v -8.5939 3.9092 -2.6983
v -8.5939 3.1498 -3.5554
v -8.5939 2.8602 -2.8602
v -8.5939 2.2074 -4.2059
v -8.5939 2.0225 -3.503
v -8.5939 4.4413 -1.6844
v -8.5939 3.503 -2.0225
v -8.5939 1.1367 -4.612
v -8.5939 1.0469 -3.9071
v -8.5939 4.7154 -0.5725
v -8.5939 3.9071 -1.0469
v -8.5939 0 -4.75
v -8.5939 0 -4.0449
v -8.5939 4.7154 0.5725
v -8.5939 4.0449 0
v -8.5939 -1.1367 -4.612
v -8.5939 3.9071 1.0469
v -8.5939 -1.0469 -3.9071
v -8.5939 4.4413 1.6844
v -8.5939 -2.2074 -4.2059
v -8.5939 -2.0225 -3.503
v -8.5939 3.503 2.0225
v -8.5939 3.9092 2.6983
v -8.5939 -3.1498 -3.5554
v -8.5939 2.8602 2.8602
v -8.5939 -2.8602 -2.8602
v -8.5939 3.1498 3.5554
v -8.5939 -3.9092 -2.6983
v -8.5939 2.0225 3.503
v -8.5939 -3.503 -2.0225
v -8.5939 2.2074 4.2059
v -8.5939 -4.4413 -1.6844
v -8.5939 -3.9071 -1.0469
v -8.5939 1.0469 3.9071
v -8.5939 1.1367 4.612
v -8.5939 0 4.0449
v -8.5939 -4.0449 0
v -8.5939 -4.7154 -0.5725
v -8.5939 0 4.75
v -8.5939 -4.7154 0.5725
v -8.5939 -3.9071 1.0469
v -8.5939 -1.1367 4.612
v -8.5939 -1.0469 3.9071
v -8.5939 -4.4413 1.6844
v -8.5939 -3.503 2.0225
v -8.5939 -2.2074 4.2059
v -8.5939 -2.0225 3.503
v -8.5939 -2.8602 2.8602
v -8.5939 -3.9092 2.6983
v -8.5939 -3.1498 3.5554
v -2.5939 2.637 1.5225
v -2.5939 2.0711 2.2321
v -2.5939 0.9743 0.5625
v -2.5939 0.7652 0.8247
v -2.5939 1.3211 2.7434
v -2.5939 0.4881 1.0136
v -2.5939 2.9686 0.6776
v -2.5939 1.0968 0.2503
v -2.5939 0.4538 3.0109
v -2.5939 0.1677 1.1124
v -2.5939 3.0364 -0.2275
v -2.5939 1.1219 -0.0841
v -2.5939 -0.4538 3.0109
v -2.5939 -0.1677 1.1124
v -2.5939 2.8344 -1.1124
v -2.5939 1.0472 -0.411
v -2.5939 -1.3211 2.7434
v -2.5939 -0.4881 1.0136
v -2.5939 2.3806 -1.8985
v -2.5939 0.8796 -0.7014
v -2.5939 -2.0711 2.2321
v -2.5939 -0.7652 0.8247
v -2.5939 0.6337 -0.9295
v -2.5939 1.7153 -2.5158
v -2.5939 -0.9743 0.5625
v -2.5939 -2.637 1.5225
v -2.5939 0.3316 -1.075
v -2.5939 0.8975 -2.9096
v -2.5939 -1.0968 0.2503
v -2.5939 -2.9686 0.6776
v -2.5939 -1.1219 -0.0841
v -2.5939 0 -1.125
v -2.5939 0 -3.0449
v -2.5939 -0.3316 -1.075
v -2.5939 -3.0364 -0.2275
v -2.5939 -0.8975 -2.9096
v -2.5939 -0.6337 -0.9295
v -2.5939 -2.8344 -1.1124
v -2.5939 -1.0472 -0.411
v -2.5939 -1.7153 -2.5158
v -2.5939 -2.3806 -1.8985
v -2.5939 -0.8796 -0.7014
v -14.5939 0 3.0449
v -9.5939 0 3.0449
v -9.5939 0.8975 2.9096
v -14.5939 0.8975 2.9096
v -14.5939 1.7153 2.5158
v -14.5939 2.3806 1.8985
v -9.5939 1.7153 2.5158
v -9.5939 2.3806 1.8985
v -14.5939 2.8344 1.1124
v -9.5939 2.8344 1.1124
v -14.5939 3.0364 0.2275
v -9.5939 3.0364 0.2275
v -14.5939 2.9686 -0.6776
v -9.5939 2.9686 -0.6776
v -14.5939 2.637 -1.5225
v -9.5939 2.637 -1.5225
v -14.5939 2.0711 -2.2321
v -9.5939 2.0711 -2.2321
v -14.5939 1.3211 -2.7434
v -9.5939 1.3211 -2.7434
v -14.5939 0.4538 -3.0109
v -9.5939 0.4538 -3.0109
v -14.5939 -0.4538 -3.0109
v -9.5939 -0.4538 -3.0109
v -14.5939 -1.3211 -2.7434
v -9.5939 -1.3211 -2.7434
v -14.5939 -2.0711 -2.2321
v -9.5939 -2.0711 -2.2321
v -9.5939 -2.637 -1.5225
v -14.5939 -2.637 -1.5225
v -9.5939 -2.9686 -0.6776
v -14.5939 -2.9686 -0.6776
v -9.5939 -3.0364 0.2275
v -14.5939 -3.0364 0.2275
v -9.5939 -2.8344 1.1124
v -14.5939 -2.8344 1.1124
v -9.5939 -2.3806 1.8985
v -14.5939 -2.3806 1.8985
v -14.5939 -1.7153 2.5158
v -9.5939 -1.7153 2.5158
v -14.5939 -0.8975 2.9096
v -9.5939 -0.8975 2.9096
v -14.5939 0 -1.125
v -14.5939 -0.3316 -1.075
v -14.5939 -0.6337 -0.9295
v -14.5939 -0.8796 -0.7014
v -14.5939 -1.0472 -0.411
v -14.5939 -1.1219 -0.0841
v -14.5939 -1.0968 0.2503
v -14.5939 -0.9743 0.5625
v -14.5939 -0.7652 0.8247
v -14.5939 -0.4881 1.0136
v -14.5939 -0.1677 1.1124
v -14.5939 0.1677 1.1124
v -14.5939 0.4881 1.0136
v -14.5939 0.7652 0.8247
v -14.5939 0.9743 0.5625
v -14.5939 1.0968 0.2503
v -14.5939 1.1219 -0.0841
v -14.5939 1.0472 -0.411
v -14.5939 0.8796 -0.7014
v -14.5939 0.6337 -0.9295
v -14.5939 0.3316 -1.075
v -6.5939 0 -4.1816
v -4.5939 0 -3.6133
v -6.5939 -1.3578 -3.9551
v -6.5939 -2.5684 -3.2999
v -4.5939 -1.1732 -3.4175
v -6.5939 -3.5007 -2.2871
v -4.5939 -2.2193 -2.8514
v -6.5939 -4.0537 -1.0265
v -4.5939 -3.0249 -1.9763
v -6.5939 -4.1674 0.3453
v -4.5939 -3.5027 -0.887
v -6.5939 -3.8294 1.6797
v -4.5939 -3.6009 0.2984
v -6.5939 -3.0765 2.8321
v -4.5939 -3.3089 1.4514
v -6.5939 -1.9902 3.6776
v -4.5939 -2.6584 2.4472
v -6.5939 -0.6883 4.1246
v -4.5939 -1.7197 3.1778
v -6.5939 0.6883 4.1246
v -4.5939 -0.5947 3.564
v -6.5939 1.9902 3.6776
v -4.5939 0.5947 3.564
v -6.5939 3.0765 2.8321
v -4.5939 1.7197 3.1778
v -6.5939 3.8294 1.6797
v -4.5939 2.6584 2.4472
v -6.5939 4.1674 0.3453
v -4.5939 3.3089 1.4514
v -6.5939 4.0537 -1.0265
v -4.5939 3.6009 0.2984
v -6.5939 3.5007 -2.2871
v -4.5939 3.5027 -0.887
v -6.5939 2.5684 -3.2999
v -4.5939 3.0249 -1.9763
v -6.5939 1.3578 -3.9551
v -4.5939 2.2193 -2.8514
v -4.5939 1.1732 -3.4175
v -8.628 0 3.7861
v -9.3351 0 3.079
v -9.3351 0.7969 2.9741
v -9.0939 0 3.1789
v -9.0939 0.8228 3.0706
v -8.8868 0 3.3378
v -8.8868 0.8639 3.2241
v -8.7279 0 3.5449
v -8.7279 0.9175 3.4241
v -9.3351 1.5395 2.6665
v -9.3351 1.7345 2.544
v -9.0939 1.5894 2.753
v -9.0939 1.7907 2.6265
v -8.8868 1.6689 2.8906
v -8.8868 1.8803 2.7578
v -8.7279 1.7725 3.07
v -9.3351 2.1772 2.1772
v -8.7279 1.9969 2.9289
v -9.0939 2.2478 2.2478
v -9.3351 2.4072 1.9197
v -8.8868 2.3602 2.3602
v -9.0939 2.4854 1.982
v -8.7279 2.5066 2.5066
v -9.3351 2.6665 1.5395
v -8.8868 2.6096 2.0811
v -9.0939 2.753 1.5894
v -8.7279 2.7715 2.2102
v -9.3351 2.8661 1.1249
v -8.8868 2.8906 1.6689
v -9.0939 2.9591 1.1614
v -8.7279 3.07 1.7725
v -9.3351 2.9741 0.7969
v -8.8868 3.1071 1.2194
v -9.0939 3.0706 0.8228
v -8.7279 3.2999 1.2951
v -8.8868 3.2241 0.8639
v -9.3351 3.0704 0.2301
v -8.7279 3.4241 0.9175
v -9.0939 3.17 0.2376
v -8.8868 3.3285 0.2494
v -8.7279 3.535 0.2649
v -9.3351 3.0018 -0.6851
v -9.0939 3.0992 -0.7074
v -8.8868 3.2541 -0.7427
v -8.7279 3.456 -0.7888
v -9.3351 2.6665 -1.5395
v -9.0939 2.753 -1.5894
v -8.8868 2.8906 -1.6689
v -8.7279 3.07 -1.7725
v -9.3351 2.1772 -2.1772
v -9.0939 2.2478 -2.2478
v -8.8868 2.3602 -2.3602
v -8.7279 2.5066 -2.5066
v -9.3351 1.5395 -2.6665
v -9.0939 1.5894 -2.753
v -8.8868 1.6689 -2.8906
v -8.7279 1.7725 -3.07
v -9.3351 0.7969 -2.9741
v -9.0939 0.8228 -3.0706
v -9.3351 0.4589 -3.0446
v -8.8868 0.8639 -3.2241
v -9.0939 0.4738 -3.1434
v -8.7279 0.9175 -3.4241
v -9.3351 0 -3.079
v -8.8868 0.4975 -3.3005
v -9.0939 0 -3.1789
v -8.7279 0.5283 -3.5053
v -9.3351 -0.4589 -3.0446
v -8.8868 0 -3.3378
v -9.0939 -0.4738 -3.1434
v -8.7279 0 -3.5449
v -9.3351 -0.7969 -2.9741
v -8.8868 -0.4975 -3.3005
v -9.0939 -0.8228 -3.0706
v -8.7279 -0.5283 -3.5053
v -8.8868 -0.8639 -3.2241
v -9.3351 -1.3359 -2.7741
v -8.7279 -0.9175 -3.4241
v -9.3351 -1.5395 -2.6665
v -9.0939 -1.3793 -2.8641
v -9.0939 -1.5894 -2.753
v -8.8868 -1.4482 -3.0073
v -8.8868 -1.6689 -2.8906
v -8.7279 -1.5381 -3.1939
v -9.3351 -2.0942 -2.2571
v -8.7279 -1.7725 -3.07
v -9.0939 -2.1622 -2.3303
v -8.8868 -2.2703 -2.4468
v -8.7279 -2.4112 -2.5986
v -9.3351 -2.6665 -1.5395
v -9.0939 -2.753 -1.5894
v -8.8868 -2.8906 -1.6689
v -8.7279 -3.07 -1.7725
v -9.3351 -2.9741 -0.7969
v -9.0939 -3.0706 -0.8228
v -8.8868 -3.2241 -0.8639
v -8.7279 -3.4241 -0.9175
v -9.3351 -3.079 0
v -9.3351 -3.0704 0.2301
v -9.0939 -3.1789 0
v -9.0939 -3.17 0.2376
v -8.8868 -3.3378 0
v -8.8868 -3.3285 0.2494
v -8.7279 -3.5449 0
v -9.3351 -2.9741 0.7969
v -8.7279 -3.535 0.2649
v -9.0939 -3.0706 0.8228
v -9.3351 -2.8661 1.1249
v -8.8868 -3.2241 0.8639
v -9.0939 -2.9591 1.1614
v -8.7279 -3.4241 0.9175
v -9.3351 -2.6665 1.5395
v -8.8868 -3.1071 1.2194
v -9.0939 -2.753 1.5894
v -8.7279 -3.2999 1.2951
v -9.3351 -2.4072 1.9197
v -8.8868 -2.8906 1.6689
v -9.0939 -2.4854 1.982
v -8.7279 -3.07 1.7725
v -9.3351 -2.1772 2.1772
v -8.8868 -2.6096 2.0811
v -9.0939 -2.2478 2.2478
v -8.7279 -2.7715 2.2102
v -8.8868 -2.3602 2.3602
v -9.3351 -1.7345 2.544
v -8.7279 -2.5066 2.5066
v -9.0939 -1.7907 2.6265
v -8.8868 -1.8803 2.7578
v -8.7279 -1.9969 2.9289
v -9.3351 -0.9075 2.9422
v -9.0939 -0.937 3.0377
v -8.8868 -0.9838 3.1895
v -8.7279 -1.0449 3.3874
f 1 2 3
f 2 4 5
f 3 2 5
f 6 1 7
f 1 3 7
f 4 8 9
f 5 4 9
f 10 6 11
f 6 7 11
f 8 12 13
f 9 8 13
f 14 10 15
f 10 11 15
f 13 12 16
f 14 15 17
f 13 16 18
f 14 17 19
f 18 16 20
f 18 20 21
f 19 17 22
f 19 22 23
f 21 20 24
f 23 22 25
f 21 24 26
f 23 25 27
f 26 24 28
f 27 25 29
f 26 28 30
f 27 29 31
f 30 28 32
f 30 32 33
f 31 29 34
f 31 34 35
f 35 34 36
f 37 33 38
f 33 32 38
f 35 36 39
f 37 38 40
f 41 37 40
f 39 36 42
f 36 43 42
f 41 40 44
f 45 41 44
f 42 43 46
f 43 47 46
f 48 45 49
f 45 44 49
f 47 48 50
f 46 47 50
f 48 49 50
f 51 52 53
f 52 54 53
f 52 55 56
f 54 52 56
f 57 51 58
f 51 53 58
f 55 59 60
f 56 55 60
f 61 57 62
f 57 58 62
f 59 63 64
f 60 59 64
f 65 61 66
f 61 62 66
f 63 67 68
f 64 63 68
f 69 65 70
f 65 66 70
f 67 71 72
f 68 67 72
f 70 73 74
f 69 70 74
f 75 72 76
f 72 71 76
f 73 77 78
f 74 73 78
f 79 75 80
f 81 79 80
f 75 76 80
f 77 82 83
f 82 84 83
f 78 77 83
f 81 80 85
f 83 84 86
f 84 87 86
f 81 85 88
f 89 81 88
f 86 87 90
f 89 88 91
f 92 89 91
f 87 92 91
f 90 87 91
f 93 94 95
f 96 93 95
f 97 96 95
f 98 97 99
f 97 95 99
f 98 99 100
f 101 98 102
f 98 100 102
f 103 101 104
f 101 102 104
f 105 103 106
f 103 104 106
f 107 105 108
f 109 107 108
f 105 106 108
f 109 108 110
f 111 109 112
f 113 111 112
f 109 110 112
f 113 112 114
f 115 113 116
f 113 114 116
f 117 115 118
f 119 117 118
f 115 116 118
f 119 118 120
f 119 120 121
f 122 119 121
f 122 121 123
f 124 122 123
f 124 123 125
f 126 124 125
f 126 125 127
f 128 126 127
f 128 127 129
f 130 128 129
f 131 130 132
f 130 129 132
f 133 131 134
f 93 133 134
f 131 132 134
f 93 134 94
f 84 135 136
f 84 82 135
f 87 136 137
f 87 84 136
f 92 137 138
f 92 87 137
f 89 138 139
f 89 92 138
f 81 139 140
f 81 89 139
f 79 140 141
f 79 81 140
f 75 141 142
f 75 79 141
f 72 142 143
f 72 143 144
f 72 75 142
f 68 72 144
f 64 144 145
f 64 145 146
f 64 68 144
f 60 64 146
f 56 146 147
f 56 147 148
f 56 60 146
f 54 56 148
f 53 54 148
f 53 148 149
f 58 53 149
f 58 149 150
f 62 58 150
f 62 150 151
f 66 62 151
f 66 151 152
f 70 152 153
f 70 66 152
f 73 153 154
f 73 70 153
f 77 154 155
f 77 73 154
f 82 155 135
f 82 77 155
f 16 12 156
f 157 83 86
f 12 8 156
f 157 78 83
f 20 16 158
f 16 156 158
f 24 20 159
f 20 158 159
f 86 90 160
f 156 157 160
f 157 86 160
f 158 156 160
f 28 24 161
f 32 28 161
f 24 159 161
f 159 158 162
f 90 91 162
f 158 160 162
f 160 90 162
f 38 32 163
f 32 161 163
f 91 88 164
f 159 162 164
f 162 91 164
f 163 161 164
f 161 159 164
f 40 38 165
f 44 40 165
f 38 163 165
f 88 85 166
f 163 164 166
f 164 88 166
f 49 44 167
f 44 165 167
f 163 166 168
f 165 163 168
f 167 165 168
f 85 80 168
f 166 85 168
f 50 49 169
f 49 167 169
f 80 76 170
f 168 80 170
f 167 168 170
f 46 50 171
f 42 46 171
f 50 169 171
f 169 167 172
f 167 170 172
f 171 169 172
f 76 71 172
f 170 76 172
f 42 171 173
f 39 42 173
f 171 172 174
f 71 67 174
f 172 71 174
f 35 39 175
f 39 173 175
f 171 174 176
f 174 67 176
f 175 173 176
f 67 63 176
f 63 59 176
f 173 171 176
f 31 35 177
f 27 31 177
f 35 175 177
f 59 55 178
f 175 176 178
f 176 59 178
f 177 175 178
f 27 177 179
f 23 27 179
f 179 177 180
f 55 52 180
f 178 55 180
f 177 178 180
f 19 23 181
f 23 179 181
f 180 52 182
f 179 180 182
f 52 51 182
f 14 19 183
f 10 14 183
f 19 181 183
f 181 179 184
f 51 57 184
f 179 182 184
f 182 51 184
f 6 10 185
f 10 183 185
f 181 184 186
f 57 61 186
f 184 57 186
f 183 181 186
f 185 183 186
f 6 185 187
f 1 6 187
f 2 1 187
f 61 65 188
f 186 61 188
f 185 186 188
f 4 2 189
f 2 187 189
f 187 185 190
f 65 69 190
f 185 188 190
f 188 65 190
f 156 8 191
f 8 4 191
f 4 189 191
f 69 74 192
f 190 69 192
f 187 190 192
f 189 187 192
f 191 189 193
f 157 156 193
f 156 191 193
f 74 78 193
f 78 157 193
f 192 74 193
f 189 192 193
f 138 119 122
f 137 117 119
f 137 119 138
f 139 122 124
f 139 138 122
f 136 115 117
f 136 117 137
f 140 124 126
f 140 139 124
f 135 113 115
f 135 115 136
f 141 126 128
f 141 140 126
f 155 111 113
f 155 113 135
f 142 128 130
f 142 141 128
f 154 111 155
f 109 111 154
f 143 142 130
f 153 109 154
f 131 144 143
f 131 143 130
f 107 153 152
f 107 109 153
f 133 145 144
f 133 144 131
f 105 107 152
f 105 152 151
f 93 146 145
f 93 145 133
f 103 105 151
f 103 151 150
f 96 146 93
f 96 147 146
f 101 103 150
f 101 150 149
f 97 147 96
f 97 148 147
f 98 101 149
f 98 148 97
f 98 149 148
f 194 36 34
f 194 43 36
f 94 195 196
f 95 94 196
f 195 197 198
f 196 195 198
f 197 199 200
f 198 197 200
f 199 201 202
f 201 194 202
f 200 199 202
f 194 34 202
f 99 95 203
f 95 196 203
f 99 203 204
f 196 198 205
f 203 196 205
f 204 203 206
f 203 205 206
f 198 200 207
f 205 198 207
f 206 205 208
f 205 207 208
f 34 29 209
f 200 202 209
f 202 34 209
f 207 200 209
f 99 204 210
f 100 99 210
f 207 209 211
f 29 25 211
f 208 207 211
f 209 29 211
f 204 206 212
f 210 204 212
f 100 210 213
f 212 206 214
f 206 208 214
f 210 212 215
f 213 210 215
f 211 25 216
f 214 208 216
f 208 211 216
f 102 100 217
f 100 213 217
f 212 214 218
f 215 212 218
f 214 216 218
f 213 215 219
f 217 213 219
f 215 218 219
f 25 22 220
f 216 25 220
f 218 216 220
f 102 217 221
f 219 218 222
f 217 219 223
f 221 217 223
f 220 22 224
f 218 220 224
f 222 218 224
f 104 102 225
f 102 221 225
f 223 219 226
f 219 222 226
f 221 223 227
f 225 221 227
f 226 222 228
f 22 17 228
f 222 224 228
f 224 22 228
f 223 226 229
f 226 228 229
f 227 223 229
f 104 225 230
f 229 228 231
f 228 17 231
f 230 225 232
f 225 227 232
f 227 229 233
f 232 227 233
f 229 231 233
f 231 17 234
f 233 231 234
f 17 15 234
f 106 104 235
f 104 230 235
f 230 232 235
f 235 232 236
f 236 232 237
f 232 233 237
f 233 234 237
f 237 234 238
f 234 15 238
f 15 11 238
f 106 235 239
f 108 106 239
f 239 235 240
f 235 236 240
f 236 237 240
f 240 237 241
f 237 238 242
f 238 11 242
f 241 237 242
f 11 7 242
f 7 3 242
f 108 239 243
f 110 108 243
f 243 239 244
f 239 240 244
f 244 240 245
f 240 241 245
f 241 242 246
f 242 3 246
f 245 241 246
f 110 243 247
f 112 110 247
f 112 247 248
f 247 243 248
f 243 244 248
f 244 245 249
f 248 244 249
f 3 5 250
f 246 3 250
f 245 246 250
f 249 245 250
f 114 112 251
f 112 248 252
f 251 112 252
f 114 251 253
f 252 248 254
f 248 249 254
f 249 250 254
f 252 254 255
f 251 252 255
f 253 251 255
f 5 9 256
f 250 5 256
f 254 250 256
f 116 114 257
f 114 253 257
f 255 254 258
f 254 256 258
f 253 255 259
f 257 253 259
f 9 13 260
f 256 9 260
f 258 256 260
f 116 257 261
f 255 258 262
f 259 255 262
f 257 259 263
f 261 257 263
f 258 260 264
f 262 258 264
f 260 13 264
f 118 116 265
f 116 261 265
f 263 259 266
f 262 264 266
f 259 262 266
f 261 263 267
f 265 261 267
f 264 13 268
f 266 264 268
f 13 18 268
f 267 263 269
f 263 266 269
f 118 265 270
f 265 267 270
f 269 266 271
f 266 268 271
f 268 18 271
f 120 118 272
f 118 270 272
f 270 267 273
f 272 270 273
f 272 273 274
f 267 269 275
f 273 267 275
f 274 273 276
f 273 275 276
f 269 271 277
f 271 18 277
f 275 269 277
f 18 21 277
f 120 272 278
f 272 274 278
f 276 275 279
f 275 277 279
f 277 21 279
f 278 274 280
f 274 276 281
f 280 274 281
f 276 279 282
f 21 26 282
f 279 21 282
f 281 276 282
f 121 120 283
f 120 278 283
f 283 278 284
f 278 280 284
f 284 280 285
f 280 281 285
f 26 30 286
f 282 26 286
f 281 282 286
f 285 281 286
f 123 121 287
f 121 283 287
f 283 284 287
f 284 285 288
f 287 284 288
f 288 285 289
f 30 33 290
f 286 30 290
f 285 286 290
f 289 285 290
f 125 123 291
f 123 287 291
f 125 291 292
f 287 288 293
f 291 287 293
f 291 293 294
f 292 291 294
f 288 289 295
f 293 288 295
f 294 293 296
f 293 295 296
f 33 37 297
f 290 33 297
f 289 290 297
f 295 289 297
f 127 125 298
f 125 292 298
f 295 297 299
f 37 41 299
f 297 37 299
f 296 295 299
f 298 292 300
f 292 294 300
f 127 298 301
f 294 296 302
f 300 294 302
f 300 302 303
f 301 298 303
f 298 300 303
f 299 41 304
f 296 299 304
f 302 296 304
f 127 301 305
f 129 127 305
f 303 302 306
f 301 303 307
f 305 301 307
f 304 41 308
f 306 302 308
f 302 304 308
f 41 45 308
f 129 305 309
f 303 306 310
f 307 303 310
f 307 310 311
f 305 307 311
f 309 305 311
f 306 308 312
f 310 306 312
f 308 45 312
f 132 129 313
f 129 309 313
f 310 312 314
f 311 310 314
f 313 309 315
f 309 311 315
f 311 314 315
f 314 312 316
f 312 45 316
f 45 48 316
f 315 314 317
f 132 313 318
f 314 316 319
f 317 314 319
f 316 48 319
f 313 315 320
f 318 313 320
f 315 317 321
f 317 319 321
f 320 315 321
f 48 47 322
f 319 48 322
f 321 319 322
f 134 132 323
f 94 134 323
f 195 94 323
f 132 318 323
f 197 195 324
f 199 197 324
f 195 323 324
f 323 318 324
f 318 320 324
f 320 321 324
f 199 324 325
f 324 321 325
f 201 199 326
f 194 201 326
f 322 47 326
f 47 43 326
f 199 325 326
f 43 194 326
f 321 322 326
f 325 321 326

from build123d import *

# Parameters (mm, degrees)
LUMEN_REACH         = 11.007
SKETCH5_R           = 1.125
SKETCH6_R           = 3.044910248
SKETCH6_R_2         = 1.125
MINCHANNEL_DEPTH    = 6
BARBCHANNELFILLET_R = 1


with BuildPart() as part:
    # Sketch4 → Barb (revolve)
    with BuildSketch(Plane.XY, mode=Mode.PRIVATE) as barb_sk:
        Polygon((-8.593939394, 0), (-8.593939394, 4.75), (-2.593939394, 3.044910248), (-2.593939394, 0), align=None)
    revolve(barb_sk.sketch.rotate(Axis((0, 0, 0), (-1, 0, 0)), 90), axis=Axis((0, 0, 0), (-1, 0, 0)))

    # Sketch5 → Lumen (cut, up to next)
    with BuildSketch(Plane(origin=(-2.593939394, 0, 0), x_dir=(0, 0, -1), z_dir=(1, 0, 0)), mode=Mode.PRIVATE) as lumen_sk1:
        Circle(SKETCH5_R)
    lumen_tool1 = extrude(lumen_sk1.sketch, amount=-LUMEN_REACH, mode=Mode.PRIVATE) & part.part
    add(lumen_tool1.solids().sort_by_distance((-2.593939, 0, 0))[0], mode=Mode.SUBTRACT)

    # Sketch6 → MinChannel (add)
    with BuildSketch(Plane.ZY.offset(8.593939394)):
        Circle(SKETCH6_R)
        with Locations(Location((0, 0, 0), (0, 0, 180))):
            Circle(SKETCH6_R_2, mode=Mode.SUBTRACT)
    extrude(amount=MINCHANNEL_DEPTH)

    # BarbChannelFillet
    barbchannelfillet_edges = [part.edges().sort_by_distance(p)[0] for p in [
        (-8.593939394, 0, -3.044910248),
    ]]
    fillet(barbchannelfillet_edges, radius=BARBCHANNELFILLET_R)


solid = part.part
